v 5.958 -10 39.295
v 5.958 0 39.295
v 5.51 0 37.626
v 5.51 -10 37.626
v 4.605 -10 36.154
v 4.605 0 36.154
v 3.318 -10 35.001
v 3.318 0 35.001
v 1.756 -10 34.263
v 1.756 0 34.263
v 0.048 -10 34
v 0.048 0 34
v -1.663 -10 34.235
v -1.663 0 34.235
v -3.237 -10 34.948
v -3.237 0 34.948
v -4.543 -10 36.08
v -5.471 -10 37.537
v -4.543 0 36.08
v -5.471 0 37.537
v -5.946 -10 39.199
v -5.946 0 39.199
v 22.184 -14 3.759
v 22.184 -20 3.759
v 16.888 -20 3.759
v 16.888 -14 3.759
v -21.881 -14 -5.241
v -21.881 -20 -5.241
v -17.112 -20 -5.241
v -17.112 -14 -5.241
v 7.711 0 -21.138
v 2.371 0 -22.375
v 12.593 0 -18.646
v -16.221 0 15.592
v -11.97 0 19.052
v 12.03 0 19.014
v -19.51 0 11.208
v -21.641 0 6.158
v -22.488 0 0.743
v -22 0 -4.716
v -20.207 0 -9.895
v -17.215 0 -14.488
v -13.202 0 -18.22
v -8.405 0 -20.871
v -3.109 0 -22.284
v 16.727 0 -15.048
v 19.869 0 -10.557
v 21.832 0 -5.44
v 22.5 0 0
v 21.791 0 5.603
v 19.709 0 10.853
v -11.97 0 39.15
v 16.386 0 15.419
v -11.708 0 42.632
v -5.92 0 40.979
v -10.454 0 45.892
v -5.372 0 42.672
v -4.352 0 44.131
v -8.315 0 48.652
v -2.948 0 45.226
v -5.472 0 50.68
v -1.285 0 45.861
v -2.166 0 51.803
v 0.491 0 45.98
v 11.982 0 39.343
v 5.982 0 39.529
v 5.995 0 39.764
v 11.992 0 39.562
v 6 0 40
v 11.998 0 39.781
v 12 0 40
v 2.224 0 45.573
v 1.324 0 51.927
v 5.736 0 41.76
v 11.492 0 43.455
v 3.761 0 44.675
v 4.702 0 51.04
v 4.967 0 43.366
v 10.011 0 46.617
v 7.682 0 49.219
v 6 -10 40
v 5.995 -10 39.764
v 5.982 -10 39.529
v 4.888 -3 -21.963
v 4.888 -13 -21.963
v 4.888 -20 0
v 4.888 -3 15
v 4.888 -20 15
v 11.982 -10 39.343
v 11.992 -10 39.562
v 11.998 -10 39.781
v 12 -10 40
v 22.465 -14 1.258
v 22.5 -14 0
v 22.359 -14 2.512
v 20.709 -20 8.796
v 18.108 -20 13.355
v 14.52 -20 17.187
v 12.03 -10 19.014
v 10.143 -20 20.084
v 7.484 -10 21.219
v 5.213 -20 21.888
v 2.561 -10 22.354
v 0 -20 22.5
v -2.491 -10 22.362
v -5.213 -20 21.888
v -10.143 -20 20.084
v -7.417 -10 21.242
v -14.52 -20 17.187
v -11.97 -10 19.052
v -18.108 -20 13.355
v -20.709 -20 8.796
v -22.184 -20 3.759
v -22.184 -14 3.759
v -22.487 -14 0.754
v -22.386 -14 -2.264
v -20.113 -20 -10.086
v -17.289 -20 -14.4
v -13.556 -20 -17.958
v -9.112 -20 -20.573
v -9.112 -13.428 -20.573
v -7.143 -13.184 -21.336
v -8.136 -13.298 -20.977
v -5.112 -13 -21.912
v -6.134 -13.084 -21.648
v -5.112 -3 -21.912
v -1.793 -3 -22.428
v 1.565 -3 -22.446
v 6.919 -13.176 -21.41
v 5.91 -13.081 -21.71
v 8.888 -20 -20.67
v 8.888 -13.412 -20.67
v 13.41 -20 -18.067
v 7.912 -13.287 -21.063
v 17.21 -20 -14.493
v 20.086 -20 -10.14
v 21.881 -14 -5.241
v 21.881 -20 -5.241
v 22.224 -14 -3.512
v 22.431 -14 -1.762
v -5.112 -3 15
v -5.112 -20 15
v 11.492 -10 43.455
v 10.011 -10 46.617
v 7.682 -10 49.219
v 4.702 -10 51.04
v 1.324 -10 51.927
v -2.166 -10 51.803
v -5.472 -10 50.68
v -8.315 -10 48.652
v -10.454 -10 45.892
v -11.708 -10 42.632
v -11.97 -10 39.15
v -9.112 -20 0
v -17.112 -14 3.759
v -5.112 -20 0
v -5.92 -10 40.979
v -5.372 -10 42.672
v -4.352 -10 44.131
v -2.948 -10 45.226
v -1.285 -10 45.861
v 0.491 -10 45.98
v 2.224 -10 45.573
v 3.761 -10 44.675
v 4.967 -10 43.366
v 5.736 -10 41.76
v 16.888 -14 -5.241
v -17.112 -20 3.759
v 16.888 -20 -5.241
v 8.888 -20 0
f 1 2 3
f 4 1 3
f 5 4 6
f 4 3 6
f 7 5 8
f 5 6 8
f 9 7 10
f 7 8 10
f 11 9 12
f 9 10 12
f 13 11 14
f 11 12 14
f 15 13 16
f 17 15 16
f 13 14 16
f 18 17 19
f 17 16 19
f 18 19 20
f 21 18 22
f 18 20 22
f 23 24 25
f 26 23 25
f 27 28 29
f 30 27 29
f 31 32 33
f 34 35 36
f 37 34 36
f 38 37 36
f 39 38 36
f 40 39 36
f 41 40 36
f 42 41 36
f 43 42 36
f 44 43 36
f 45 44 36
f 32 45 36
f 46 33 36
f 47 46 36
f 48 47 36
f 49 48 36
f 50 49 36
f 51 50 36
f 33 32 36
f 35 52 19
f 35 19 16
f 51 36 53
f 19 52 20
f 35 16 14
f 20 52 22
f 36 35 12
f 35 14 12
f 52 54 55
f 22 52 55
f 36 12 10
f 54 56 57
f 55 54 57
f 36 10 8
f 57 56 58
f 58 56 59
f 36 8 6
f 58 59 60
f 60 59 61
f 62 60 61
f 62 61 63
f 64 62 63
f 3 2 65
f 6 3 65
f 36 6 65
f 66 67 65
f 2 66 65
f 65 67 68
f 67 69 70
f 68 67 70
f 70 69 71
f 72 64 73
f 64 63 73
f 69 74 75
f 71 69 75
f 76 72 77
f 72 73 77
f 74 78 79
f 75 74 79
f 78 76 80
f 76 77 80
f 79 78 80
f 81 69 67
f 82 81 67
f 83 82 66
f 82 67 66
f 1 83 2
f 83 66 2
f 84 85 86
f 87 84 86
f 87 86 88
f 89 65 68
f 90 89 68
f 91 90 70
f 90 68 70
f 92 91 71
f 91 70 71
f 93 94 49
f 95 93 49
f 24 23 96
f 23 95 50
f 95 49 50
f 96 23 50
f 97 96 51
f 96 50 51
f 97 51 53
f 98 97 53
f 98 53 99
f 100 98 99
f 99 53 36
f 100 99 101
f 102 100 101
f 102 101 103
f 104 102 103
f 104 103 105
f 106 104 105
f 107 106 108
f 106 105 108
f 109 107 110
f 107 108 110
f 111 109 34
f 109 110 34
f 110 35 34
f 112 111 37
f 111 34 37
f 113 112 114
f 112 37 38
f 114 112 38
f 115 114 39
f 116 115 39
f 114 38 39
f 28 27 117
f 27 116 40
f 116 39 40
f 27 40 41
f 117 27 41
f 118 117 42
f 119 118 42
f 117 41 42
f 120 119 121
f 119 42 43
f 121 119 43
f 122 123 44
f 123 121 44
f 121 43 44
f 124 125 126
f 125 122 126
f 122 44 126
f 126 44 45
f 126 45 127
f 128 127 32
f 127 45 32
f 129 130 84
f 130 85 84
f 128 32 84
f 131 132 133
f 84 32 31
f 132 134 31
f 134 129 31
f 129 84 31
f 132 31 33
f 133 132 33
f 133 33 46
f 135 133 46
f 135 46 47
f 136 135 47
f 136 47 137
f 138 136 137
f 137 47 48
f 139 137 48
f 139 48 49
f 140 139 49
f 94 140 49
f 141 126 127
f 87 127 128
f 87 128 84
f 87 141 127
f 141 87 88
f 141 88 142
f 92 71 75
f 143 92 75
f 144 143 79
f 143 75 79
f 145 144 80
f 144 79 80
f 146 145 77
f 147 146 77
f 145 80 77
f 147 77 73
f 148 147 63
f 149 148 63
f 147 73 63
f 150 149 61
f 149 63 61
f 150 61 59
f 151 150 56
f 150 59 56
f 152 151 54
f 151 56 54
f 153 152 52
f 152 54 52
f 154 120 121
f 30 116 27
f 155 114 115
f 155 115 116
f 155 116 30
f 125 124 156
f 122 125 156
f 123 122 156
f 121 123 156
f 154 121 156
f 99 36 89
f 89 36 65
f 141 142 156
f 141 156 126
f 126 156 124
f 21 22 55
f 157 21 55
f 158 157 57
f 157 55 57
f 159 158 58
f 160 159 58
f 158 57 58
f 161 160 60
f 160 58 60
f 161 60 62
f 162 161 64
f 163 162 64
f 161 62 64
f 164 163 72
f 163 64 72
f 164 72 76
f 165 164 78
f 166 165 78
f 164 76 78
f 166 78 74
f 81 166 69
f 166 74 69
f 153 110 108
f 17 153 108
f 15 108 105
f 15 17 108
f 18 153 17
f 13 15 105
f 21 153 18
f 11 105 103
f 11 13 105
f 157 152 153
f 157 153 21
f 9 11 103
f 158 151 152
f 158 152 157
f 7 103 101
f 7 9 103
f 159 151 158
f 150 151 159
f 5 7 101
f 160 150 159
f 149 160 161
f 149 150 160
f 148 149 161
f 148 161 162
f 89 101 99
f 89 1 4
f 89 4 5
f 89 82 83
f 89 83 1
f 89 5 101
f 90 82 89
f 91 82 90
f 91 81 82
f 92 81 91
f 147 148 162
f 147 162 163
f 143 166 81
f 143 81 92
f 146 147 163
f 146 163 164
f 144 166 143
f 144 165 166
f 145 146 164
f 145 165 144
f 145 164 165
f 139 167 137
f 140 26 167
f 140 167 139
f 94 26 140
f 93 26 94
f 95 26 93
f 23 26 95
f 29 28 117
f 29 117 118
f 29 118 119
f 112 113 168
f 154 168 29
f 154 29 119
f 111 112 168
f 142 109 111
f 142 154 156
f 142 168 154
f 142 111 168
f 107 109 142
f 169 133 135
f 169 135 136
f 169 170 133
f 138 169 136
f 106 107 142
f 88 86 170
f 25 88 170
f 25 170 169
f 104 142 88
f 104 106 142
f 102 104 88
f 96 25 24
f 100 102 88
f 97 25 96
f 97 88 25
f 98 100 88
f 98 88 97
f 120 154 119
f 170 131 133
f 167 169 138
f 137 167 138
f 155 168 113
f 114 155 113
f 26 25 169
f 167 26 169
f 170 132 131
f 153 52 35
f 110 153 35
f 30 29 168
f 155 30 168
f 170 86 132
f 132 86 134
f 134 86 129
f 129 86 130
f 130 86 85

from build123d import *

# Parameters (mm, degrees)
F0_R      = 22.5
F1_DEPTH  = 20
F2_W      = 2.5675058744
F2_H      = 9
F3_DEPTH  = 6
F5_DEPTH  = 17
F7_DEPTH  = 4
F9_DEPTH  = 4
F11_DEPTH = 10


with BuildPart() as f1:
    # F0 (on Front) → F1 (new body)
    with BuildSketch(Plane.XZ):
        Circle(F0_R)
    extrude(amount=F1_DEPTH)

    # F2 (on face) → F3 (cut)
    with BuildSketch(Plane.XZ.offset(20)):
        with BuildLine():
            Line((-19.6791486824, 3.7585074455), (-22.183859488, 3.7585074455))
            ThreePointArc((-22.183859488, 3.7585074455), (-22.4872686861, -0.7568005275), (-21.8809678899, -5.2414925545))
            Line((-21.8809678899, -5.2414925545), (-19.6791486824, -5.2414925545))
            Line((-19.6791486824, -5.2414925545), (-19.6791486824, 3.7585074455))
        make_face()
        with Locations((-18.3953957452, -0.7414925545)):
            Rectangle(F2_W, F2_H)
        with BuildLine():
            ThreePointArc((22.5, 0), (22.42082557, 1.885889912), (22.183859488, 3.7585074455))
            Line((22.183859488, 3.7585074455), (16.888357192, 3.7585074455))
            Line((16.888357192, 3.7585074455), (16.888357192, -5.2414925545))
            Line((16.888357192, -5.2414925545), (21.8809678899, -5.2414925545))
            ThreePointArc((21.8809678899, -5.2414925545), (22.3447060567, -2.638960257), (22.5, 0))
        make_face()
    extrude(amount=-F3_DEPTH, mode=Mode.SUBTRACT)

    # F4 (on face) → F5 (cut)
    with BuildSketch(Plane.XZ.offset(20)):
        with BuildLine():
            ThreePointArc((-5.111642808, -21.9116660207), (-0.1145059859, -22.4997086288), (4.888357192, -21.962558229))
            Line((4.888357192, -21.962558229), (4.888357192, 15))
            Line((4.888357192, 15), (-5.111642808, 15))
            Line((-5.111642808, 15), (-5.111642808, -21.9116660207))
        make_face()
    extrude(amount=-F5_DEPTH, mode=Mode.SUBTRACT)

    # F6 (on face) → F7 (cut)
    with BuildSketch(Plane(origin=(4.888357192, 0, 0), x_dir=(0, -1, 0), z_dir=(-1, 0, 0))):
        Polygon((20, 0), (13, -21.962558229), (20, -21.962558229), align=None)
    extrude(amount=-F7_DEPTH, mode=Mode.SUBTRACT)

    # F8 (on face) → F9 (cut)
    with BuildSketch(Plane.YZ.offset(-5.111642808)):
        Polygon((-20, -21.9116660207), (-13, -21.9116660207), (-20, 0), align=None)
    extrude(amount=-F9_DEPTH, mode=Mode.SUBTRACT)

    # F10 (on Front) → F11 (join)
    with BuildSketch(Plane.XZ):
        with BuildLine():
            ThreePointArc((11.9820211506, 39.3433652862), (0.0967969112, 28.0003904081), (-11.9698688592, 39.1501532526))
            Line((-11.9698688592, 39.1501532526), (-11.9698688592, 18.8409157593))
            Line((-11.9698688592, 18.8409157593), (12.0301311408, 18.8409157593))
            Line((12.0301311408, 18.8409157593), (11.9820211506, 39.3433652862))
        make_face()
        with BuildLine():
            ThreePointArc((5.958410645, 39.2947747978), (0.0483984556, 34.0001952041), (-5.9462583536, 39.1987437411))
            Line((-5.9462583536, 39.1987437411), (-11.9698688592, 39.1501532526))
            ThreePointArc((-11.9698688592, 39.1501532526), (0.0967969112, 28.0003904081), (11.9820211506, 39.3433652862))
            Line((11.9820211506, 39.3433652862), (5.958410645, 39.2947747978))
        make_face()
        with BuildLine():
            ThreePointArc((-5.9462583536, 39.1987437411), (-0.4015282546, 45.9865495121), (6, 40))
            ThreePointArc((6, 40), (5.9895936369, 39.6467747672), (5.958410645, 39.2947747978))
            Line((5.958410645, 39.2947747978), (11.9820211506, 39.3433652862))
            ThreePointArc((11.9820211506, 39.3433652862), (11.9955044456, 39.6715595996), (12, 40))
            ThreePointArc((12, 40), (-0.4251903631, 51.992464849), (-11.9698688592, 39.1501532526))
            Line((-11.9698688592, 39.1501532526), (-5.9462583536, 39.1987437411))
        make_face()
    extrude(amount=F11_DEPTH)


solid = f1.part
